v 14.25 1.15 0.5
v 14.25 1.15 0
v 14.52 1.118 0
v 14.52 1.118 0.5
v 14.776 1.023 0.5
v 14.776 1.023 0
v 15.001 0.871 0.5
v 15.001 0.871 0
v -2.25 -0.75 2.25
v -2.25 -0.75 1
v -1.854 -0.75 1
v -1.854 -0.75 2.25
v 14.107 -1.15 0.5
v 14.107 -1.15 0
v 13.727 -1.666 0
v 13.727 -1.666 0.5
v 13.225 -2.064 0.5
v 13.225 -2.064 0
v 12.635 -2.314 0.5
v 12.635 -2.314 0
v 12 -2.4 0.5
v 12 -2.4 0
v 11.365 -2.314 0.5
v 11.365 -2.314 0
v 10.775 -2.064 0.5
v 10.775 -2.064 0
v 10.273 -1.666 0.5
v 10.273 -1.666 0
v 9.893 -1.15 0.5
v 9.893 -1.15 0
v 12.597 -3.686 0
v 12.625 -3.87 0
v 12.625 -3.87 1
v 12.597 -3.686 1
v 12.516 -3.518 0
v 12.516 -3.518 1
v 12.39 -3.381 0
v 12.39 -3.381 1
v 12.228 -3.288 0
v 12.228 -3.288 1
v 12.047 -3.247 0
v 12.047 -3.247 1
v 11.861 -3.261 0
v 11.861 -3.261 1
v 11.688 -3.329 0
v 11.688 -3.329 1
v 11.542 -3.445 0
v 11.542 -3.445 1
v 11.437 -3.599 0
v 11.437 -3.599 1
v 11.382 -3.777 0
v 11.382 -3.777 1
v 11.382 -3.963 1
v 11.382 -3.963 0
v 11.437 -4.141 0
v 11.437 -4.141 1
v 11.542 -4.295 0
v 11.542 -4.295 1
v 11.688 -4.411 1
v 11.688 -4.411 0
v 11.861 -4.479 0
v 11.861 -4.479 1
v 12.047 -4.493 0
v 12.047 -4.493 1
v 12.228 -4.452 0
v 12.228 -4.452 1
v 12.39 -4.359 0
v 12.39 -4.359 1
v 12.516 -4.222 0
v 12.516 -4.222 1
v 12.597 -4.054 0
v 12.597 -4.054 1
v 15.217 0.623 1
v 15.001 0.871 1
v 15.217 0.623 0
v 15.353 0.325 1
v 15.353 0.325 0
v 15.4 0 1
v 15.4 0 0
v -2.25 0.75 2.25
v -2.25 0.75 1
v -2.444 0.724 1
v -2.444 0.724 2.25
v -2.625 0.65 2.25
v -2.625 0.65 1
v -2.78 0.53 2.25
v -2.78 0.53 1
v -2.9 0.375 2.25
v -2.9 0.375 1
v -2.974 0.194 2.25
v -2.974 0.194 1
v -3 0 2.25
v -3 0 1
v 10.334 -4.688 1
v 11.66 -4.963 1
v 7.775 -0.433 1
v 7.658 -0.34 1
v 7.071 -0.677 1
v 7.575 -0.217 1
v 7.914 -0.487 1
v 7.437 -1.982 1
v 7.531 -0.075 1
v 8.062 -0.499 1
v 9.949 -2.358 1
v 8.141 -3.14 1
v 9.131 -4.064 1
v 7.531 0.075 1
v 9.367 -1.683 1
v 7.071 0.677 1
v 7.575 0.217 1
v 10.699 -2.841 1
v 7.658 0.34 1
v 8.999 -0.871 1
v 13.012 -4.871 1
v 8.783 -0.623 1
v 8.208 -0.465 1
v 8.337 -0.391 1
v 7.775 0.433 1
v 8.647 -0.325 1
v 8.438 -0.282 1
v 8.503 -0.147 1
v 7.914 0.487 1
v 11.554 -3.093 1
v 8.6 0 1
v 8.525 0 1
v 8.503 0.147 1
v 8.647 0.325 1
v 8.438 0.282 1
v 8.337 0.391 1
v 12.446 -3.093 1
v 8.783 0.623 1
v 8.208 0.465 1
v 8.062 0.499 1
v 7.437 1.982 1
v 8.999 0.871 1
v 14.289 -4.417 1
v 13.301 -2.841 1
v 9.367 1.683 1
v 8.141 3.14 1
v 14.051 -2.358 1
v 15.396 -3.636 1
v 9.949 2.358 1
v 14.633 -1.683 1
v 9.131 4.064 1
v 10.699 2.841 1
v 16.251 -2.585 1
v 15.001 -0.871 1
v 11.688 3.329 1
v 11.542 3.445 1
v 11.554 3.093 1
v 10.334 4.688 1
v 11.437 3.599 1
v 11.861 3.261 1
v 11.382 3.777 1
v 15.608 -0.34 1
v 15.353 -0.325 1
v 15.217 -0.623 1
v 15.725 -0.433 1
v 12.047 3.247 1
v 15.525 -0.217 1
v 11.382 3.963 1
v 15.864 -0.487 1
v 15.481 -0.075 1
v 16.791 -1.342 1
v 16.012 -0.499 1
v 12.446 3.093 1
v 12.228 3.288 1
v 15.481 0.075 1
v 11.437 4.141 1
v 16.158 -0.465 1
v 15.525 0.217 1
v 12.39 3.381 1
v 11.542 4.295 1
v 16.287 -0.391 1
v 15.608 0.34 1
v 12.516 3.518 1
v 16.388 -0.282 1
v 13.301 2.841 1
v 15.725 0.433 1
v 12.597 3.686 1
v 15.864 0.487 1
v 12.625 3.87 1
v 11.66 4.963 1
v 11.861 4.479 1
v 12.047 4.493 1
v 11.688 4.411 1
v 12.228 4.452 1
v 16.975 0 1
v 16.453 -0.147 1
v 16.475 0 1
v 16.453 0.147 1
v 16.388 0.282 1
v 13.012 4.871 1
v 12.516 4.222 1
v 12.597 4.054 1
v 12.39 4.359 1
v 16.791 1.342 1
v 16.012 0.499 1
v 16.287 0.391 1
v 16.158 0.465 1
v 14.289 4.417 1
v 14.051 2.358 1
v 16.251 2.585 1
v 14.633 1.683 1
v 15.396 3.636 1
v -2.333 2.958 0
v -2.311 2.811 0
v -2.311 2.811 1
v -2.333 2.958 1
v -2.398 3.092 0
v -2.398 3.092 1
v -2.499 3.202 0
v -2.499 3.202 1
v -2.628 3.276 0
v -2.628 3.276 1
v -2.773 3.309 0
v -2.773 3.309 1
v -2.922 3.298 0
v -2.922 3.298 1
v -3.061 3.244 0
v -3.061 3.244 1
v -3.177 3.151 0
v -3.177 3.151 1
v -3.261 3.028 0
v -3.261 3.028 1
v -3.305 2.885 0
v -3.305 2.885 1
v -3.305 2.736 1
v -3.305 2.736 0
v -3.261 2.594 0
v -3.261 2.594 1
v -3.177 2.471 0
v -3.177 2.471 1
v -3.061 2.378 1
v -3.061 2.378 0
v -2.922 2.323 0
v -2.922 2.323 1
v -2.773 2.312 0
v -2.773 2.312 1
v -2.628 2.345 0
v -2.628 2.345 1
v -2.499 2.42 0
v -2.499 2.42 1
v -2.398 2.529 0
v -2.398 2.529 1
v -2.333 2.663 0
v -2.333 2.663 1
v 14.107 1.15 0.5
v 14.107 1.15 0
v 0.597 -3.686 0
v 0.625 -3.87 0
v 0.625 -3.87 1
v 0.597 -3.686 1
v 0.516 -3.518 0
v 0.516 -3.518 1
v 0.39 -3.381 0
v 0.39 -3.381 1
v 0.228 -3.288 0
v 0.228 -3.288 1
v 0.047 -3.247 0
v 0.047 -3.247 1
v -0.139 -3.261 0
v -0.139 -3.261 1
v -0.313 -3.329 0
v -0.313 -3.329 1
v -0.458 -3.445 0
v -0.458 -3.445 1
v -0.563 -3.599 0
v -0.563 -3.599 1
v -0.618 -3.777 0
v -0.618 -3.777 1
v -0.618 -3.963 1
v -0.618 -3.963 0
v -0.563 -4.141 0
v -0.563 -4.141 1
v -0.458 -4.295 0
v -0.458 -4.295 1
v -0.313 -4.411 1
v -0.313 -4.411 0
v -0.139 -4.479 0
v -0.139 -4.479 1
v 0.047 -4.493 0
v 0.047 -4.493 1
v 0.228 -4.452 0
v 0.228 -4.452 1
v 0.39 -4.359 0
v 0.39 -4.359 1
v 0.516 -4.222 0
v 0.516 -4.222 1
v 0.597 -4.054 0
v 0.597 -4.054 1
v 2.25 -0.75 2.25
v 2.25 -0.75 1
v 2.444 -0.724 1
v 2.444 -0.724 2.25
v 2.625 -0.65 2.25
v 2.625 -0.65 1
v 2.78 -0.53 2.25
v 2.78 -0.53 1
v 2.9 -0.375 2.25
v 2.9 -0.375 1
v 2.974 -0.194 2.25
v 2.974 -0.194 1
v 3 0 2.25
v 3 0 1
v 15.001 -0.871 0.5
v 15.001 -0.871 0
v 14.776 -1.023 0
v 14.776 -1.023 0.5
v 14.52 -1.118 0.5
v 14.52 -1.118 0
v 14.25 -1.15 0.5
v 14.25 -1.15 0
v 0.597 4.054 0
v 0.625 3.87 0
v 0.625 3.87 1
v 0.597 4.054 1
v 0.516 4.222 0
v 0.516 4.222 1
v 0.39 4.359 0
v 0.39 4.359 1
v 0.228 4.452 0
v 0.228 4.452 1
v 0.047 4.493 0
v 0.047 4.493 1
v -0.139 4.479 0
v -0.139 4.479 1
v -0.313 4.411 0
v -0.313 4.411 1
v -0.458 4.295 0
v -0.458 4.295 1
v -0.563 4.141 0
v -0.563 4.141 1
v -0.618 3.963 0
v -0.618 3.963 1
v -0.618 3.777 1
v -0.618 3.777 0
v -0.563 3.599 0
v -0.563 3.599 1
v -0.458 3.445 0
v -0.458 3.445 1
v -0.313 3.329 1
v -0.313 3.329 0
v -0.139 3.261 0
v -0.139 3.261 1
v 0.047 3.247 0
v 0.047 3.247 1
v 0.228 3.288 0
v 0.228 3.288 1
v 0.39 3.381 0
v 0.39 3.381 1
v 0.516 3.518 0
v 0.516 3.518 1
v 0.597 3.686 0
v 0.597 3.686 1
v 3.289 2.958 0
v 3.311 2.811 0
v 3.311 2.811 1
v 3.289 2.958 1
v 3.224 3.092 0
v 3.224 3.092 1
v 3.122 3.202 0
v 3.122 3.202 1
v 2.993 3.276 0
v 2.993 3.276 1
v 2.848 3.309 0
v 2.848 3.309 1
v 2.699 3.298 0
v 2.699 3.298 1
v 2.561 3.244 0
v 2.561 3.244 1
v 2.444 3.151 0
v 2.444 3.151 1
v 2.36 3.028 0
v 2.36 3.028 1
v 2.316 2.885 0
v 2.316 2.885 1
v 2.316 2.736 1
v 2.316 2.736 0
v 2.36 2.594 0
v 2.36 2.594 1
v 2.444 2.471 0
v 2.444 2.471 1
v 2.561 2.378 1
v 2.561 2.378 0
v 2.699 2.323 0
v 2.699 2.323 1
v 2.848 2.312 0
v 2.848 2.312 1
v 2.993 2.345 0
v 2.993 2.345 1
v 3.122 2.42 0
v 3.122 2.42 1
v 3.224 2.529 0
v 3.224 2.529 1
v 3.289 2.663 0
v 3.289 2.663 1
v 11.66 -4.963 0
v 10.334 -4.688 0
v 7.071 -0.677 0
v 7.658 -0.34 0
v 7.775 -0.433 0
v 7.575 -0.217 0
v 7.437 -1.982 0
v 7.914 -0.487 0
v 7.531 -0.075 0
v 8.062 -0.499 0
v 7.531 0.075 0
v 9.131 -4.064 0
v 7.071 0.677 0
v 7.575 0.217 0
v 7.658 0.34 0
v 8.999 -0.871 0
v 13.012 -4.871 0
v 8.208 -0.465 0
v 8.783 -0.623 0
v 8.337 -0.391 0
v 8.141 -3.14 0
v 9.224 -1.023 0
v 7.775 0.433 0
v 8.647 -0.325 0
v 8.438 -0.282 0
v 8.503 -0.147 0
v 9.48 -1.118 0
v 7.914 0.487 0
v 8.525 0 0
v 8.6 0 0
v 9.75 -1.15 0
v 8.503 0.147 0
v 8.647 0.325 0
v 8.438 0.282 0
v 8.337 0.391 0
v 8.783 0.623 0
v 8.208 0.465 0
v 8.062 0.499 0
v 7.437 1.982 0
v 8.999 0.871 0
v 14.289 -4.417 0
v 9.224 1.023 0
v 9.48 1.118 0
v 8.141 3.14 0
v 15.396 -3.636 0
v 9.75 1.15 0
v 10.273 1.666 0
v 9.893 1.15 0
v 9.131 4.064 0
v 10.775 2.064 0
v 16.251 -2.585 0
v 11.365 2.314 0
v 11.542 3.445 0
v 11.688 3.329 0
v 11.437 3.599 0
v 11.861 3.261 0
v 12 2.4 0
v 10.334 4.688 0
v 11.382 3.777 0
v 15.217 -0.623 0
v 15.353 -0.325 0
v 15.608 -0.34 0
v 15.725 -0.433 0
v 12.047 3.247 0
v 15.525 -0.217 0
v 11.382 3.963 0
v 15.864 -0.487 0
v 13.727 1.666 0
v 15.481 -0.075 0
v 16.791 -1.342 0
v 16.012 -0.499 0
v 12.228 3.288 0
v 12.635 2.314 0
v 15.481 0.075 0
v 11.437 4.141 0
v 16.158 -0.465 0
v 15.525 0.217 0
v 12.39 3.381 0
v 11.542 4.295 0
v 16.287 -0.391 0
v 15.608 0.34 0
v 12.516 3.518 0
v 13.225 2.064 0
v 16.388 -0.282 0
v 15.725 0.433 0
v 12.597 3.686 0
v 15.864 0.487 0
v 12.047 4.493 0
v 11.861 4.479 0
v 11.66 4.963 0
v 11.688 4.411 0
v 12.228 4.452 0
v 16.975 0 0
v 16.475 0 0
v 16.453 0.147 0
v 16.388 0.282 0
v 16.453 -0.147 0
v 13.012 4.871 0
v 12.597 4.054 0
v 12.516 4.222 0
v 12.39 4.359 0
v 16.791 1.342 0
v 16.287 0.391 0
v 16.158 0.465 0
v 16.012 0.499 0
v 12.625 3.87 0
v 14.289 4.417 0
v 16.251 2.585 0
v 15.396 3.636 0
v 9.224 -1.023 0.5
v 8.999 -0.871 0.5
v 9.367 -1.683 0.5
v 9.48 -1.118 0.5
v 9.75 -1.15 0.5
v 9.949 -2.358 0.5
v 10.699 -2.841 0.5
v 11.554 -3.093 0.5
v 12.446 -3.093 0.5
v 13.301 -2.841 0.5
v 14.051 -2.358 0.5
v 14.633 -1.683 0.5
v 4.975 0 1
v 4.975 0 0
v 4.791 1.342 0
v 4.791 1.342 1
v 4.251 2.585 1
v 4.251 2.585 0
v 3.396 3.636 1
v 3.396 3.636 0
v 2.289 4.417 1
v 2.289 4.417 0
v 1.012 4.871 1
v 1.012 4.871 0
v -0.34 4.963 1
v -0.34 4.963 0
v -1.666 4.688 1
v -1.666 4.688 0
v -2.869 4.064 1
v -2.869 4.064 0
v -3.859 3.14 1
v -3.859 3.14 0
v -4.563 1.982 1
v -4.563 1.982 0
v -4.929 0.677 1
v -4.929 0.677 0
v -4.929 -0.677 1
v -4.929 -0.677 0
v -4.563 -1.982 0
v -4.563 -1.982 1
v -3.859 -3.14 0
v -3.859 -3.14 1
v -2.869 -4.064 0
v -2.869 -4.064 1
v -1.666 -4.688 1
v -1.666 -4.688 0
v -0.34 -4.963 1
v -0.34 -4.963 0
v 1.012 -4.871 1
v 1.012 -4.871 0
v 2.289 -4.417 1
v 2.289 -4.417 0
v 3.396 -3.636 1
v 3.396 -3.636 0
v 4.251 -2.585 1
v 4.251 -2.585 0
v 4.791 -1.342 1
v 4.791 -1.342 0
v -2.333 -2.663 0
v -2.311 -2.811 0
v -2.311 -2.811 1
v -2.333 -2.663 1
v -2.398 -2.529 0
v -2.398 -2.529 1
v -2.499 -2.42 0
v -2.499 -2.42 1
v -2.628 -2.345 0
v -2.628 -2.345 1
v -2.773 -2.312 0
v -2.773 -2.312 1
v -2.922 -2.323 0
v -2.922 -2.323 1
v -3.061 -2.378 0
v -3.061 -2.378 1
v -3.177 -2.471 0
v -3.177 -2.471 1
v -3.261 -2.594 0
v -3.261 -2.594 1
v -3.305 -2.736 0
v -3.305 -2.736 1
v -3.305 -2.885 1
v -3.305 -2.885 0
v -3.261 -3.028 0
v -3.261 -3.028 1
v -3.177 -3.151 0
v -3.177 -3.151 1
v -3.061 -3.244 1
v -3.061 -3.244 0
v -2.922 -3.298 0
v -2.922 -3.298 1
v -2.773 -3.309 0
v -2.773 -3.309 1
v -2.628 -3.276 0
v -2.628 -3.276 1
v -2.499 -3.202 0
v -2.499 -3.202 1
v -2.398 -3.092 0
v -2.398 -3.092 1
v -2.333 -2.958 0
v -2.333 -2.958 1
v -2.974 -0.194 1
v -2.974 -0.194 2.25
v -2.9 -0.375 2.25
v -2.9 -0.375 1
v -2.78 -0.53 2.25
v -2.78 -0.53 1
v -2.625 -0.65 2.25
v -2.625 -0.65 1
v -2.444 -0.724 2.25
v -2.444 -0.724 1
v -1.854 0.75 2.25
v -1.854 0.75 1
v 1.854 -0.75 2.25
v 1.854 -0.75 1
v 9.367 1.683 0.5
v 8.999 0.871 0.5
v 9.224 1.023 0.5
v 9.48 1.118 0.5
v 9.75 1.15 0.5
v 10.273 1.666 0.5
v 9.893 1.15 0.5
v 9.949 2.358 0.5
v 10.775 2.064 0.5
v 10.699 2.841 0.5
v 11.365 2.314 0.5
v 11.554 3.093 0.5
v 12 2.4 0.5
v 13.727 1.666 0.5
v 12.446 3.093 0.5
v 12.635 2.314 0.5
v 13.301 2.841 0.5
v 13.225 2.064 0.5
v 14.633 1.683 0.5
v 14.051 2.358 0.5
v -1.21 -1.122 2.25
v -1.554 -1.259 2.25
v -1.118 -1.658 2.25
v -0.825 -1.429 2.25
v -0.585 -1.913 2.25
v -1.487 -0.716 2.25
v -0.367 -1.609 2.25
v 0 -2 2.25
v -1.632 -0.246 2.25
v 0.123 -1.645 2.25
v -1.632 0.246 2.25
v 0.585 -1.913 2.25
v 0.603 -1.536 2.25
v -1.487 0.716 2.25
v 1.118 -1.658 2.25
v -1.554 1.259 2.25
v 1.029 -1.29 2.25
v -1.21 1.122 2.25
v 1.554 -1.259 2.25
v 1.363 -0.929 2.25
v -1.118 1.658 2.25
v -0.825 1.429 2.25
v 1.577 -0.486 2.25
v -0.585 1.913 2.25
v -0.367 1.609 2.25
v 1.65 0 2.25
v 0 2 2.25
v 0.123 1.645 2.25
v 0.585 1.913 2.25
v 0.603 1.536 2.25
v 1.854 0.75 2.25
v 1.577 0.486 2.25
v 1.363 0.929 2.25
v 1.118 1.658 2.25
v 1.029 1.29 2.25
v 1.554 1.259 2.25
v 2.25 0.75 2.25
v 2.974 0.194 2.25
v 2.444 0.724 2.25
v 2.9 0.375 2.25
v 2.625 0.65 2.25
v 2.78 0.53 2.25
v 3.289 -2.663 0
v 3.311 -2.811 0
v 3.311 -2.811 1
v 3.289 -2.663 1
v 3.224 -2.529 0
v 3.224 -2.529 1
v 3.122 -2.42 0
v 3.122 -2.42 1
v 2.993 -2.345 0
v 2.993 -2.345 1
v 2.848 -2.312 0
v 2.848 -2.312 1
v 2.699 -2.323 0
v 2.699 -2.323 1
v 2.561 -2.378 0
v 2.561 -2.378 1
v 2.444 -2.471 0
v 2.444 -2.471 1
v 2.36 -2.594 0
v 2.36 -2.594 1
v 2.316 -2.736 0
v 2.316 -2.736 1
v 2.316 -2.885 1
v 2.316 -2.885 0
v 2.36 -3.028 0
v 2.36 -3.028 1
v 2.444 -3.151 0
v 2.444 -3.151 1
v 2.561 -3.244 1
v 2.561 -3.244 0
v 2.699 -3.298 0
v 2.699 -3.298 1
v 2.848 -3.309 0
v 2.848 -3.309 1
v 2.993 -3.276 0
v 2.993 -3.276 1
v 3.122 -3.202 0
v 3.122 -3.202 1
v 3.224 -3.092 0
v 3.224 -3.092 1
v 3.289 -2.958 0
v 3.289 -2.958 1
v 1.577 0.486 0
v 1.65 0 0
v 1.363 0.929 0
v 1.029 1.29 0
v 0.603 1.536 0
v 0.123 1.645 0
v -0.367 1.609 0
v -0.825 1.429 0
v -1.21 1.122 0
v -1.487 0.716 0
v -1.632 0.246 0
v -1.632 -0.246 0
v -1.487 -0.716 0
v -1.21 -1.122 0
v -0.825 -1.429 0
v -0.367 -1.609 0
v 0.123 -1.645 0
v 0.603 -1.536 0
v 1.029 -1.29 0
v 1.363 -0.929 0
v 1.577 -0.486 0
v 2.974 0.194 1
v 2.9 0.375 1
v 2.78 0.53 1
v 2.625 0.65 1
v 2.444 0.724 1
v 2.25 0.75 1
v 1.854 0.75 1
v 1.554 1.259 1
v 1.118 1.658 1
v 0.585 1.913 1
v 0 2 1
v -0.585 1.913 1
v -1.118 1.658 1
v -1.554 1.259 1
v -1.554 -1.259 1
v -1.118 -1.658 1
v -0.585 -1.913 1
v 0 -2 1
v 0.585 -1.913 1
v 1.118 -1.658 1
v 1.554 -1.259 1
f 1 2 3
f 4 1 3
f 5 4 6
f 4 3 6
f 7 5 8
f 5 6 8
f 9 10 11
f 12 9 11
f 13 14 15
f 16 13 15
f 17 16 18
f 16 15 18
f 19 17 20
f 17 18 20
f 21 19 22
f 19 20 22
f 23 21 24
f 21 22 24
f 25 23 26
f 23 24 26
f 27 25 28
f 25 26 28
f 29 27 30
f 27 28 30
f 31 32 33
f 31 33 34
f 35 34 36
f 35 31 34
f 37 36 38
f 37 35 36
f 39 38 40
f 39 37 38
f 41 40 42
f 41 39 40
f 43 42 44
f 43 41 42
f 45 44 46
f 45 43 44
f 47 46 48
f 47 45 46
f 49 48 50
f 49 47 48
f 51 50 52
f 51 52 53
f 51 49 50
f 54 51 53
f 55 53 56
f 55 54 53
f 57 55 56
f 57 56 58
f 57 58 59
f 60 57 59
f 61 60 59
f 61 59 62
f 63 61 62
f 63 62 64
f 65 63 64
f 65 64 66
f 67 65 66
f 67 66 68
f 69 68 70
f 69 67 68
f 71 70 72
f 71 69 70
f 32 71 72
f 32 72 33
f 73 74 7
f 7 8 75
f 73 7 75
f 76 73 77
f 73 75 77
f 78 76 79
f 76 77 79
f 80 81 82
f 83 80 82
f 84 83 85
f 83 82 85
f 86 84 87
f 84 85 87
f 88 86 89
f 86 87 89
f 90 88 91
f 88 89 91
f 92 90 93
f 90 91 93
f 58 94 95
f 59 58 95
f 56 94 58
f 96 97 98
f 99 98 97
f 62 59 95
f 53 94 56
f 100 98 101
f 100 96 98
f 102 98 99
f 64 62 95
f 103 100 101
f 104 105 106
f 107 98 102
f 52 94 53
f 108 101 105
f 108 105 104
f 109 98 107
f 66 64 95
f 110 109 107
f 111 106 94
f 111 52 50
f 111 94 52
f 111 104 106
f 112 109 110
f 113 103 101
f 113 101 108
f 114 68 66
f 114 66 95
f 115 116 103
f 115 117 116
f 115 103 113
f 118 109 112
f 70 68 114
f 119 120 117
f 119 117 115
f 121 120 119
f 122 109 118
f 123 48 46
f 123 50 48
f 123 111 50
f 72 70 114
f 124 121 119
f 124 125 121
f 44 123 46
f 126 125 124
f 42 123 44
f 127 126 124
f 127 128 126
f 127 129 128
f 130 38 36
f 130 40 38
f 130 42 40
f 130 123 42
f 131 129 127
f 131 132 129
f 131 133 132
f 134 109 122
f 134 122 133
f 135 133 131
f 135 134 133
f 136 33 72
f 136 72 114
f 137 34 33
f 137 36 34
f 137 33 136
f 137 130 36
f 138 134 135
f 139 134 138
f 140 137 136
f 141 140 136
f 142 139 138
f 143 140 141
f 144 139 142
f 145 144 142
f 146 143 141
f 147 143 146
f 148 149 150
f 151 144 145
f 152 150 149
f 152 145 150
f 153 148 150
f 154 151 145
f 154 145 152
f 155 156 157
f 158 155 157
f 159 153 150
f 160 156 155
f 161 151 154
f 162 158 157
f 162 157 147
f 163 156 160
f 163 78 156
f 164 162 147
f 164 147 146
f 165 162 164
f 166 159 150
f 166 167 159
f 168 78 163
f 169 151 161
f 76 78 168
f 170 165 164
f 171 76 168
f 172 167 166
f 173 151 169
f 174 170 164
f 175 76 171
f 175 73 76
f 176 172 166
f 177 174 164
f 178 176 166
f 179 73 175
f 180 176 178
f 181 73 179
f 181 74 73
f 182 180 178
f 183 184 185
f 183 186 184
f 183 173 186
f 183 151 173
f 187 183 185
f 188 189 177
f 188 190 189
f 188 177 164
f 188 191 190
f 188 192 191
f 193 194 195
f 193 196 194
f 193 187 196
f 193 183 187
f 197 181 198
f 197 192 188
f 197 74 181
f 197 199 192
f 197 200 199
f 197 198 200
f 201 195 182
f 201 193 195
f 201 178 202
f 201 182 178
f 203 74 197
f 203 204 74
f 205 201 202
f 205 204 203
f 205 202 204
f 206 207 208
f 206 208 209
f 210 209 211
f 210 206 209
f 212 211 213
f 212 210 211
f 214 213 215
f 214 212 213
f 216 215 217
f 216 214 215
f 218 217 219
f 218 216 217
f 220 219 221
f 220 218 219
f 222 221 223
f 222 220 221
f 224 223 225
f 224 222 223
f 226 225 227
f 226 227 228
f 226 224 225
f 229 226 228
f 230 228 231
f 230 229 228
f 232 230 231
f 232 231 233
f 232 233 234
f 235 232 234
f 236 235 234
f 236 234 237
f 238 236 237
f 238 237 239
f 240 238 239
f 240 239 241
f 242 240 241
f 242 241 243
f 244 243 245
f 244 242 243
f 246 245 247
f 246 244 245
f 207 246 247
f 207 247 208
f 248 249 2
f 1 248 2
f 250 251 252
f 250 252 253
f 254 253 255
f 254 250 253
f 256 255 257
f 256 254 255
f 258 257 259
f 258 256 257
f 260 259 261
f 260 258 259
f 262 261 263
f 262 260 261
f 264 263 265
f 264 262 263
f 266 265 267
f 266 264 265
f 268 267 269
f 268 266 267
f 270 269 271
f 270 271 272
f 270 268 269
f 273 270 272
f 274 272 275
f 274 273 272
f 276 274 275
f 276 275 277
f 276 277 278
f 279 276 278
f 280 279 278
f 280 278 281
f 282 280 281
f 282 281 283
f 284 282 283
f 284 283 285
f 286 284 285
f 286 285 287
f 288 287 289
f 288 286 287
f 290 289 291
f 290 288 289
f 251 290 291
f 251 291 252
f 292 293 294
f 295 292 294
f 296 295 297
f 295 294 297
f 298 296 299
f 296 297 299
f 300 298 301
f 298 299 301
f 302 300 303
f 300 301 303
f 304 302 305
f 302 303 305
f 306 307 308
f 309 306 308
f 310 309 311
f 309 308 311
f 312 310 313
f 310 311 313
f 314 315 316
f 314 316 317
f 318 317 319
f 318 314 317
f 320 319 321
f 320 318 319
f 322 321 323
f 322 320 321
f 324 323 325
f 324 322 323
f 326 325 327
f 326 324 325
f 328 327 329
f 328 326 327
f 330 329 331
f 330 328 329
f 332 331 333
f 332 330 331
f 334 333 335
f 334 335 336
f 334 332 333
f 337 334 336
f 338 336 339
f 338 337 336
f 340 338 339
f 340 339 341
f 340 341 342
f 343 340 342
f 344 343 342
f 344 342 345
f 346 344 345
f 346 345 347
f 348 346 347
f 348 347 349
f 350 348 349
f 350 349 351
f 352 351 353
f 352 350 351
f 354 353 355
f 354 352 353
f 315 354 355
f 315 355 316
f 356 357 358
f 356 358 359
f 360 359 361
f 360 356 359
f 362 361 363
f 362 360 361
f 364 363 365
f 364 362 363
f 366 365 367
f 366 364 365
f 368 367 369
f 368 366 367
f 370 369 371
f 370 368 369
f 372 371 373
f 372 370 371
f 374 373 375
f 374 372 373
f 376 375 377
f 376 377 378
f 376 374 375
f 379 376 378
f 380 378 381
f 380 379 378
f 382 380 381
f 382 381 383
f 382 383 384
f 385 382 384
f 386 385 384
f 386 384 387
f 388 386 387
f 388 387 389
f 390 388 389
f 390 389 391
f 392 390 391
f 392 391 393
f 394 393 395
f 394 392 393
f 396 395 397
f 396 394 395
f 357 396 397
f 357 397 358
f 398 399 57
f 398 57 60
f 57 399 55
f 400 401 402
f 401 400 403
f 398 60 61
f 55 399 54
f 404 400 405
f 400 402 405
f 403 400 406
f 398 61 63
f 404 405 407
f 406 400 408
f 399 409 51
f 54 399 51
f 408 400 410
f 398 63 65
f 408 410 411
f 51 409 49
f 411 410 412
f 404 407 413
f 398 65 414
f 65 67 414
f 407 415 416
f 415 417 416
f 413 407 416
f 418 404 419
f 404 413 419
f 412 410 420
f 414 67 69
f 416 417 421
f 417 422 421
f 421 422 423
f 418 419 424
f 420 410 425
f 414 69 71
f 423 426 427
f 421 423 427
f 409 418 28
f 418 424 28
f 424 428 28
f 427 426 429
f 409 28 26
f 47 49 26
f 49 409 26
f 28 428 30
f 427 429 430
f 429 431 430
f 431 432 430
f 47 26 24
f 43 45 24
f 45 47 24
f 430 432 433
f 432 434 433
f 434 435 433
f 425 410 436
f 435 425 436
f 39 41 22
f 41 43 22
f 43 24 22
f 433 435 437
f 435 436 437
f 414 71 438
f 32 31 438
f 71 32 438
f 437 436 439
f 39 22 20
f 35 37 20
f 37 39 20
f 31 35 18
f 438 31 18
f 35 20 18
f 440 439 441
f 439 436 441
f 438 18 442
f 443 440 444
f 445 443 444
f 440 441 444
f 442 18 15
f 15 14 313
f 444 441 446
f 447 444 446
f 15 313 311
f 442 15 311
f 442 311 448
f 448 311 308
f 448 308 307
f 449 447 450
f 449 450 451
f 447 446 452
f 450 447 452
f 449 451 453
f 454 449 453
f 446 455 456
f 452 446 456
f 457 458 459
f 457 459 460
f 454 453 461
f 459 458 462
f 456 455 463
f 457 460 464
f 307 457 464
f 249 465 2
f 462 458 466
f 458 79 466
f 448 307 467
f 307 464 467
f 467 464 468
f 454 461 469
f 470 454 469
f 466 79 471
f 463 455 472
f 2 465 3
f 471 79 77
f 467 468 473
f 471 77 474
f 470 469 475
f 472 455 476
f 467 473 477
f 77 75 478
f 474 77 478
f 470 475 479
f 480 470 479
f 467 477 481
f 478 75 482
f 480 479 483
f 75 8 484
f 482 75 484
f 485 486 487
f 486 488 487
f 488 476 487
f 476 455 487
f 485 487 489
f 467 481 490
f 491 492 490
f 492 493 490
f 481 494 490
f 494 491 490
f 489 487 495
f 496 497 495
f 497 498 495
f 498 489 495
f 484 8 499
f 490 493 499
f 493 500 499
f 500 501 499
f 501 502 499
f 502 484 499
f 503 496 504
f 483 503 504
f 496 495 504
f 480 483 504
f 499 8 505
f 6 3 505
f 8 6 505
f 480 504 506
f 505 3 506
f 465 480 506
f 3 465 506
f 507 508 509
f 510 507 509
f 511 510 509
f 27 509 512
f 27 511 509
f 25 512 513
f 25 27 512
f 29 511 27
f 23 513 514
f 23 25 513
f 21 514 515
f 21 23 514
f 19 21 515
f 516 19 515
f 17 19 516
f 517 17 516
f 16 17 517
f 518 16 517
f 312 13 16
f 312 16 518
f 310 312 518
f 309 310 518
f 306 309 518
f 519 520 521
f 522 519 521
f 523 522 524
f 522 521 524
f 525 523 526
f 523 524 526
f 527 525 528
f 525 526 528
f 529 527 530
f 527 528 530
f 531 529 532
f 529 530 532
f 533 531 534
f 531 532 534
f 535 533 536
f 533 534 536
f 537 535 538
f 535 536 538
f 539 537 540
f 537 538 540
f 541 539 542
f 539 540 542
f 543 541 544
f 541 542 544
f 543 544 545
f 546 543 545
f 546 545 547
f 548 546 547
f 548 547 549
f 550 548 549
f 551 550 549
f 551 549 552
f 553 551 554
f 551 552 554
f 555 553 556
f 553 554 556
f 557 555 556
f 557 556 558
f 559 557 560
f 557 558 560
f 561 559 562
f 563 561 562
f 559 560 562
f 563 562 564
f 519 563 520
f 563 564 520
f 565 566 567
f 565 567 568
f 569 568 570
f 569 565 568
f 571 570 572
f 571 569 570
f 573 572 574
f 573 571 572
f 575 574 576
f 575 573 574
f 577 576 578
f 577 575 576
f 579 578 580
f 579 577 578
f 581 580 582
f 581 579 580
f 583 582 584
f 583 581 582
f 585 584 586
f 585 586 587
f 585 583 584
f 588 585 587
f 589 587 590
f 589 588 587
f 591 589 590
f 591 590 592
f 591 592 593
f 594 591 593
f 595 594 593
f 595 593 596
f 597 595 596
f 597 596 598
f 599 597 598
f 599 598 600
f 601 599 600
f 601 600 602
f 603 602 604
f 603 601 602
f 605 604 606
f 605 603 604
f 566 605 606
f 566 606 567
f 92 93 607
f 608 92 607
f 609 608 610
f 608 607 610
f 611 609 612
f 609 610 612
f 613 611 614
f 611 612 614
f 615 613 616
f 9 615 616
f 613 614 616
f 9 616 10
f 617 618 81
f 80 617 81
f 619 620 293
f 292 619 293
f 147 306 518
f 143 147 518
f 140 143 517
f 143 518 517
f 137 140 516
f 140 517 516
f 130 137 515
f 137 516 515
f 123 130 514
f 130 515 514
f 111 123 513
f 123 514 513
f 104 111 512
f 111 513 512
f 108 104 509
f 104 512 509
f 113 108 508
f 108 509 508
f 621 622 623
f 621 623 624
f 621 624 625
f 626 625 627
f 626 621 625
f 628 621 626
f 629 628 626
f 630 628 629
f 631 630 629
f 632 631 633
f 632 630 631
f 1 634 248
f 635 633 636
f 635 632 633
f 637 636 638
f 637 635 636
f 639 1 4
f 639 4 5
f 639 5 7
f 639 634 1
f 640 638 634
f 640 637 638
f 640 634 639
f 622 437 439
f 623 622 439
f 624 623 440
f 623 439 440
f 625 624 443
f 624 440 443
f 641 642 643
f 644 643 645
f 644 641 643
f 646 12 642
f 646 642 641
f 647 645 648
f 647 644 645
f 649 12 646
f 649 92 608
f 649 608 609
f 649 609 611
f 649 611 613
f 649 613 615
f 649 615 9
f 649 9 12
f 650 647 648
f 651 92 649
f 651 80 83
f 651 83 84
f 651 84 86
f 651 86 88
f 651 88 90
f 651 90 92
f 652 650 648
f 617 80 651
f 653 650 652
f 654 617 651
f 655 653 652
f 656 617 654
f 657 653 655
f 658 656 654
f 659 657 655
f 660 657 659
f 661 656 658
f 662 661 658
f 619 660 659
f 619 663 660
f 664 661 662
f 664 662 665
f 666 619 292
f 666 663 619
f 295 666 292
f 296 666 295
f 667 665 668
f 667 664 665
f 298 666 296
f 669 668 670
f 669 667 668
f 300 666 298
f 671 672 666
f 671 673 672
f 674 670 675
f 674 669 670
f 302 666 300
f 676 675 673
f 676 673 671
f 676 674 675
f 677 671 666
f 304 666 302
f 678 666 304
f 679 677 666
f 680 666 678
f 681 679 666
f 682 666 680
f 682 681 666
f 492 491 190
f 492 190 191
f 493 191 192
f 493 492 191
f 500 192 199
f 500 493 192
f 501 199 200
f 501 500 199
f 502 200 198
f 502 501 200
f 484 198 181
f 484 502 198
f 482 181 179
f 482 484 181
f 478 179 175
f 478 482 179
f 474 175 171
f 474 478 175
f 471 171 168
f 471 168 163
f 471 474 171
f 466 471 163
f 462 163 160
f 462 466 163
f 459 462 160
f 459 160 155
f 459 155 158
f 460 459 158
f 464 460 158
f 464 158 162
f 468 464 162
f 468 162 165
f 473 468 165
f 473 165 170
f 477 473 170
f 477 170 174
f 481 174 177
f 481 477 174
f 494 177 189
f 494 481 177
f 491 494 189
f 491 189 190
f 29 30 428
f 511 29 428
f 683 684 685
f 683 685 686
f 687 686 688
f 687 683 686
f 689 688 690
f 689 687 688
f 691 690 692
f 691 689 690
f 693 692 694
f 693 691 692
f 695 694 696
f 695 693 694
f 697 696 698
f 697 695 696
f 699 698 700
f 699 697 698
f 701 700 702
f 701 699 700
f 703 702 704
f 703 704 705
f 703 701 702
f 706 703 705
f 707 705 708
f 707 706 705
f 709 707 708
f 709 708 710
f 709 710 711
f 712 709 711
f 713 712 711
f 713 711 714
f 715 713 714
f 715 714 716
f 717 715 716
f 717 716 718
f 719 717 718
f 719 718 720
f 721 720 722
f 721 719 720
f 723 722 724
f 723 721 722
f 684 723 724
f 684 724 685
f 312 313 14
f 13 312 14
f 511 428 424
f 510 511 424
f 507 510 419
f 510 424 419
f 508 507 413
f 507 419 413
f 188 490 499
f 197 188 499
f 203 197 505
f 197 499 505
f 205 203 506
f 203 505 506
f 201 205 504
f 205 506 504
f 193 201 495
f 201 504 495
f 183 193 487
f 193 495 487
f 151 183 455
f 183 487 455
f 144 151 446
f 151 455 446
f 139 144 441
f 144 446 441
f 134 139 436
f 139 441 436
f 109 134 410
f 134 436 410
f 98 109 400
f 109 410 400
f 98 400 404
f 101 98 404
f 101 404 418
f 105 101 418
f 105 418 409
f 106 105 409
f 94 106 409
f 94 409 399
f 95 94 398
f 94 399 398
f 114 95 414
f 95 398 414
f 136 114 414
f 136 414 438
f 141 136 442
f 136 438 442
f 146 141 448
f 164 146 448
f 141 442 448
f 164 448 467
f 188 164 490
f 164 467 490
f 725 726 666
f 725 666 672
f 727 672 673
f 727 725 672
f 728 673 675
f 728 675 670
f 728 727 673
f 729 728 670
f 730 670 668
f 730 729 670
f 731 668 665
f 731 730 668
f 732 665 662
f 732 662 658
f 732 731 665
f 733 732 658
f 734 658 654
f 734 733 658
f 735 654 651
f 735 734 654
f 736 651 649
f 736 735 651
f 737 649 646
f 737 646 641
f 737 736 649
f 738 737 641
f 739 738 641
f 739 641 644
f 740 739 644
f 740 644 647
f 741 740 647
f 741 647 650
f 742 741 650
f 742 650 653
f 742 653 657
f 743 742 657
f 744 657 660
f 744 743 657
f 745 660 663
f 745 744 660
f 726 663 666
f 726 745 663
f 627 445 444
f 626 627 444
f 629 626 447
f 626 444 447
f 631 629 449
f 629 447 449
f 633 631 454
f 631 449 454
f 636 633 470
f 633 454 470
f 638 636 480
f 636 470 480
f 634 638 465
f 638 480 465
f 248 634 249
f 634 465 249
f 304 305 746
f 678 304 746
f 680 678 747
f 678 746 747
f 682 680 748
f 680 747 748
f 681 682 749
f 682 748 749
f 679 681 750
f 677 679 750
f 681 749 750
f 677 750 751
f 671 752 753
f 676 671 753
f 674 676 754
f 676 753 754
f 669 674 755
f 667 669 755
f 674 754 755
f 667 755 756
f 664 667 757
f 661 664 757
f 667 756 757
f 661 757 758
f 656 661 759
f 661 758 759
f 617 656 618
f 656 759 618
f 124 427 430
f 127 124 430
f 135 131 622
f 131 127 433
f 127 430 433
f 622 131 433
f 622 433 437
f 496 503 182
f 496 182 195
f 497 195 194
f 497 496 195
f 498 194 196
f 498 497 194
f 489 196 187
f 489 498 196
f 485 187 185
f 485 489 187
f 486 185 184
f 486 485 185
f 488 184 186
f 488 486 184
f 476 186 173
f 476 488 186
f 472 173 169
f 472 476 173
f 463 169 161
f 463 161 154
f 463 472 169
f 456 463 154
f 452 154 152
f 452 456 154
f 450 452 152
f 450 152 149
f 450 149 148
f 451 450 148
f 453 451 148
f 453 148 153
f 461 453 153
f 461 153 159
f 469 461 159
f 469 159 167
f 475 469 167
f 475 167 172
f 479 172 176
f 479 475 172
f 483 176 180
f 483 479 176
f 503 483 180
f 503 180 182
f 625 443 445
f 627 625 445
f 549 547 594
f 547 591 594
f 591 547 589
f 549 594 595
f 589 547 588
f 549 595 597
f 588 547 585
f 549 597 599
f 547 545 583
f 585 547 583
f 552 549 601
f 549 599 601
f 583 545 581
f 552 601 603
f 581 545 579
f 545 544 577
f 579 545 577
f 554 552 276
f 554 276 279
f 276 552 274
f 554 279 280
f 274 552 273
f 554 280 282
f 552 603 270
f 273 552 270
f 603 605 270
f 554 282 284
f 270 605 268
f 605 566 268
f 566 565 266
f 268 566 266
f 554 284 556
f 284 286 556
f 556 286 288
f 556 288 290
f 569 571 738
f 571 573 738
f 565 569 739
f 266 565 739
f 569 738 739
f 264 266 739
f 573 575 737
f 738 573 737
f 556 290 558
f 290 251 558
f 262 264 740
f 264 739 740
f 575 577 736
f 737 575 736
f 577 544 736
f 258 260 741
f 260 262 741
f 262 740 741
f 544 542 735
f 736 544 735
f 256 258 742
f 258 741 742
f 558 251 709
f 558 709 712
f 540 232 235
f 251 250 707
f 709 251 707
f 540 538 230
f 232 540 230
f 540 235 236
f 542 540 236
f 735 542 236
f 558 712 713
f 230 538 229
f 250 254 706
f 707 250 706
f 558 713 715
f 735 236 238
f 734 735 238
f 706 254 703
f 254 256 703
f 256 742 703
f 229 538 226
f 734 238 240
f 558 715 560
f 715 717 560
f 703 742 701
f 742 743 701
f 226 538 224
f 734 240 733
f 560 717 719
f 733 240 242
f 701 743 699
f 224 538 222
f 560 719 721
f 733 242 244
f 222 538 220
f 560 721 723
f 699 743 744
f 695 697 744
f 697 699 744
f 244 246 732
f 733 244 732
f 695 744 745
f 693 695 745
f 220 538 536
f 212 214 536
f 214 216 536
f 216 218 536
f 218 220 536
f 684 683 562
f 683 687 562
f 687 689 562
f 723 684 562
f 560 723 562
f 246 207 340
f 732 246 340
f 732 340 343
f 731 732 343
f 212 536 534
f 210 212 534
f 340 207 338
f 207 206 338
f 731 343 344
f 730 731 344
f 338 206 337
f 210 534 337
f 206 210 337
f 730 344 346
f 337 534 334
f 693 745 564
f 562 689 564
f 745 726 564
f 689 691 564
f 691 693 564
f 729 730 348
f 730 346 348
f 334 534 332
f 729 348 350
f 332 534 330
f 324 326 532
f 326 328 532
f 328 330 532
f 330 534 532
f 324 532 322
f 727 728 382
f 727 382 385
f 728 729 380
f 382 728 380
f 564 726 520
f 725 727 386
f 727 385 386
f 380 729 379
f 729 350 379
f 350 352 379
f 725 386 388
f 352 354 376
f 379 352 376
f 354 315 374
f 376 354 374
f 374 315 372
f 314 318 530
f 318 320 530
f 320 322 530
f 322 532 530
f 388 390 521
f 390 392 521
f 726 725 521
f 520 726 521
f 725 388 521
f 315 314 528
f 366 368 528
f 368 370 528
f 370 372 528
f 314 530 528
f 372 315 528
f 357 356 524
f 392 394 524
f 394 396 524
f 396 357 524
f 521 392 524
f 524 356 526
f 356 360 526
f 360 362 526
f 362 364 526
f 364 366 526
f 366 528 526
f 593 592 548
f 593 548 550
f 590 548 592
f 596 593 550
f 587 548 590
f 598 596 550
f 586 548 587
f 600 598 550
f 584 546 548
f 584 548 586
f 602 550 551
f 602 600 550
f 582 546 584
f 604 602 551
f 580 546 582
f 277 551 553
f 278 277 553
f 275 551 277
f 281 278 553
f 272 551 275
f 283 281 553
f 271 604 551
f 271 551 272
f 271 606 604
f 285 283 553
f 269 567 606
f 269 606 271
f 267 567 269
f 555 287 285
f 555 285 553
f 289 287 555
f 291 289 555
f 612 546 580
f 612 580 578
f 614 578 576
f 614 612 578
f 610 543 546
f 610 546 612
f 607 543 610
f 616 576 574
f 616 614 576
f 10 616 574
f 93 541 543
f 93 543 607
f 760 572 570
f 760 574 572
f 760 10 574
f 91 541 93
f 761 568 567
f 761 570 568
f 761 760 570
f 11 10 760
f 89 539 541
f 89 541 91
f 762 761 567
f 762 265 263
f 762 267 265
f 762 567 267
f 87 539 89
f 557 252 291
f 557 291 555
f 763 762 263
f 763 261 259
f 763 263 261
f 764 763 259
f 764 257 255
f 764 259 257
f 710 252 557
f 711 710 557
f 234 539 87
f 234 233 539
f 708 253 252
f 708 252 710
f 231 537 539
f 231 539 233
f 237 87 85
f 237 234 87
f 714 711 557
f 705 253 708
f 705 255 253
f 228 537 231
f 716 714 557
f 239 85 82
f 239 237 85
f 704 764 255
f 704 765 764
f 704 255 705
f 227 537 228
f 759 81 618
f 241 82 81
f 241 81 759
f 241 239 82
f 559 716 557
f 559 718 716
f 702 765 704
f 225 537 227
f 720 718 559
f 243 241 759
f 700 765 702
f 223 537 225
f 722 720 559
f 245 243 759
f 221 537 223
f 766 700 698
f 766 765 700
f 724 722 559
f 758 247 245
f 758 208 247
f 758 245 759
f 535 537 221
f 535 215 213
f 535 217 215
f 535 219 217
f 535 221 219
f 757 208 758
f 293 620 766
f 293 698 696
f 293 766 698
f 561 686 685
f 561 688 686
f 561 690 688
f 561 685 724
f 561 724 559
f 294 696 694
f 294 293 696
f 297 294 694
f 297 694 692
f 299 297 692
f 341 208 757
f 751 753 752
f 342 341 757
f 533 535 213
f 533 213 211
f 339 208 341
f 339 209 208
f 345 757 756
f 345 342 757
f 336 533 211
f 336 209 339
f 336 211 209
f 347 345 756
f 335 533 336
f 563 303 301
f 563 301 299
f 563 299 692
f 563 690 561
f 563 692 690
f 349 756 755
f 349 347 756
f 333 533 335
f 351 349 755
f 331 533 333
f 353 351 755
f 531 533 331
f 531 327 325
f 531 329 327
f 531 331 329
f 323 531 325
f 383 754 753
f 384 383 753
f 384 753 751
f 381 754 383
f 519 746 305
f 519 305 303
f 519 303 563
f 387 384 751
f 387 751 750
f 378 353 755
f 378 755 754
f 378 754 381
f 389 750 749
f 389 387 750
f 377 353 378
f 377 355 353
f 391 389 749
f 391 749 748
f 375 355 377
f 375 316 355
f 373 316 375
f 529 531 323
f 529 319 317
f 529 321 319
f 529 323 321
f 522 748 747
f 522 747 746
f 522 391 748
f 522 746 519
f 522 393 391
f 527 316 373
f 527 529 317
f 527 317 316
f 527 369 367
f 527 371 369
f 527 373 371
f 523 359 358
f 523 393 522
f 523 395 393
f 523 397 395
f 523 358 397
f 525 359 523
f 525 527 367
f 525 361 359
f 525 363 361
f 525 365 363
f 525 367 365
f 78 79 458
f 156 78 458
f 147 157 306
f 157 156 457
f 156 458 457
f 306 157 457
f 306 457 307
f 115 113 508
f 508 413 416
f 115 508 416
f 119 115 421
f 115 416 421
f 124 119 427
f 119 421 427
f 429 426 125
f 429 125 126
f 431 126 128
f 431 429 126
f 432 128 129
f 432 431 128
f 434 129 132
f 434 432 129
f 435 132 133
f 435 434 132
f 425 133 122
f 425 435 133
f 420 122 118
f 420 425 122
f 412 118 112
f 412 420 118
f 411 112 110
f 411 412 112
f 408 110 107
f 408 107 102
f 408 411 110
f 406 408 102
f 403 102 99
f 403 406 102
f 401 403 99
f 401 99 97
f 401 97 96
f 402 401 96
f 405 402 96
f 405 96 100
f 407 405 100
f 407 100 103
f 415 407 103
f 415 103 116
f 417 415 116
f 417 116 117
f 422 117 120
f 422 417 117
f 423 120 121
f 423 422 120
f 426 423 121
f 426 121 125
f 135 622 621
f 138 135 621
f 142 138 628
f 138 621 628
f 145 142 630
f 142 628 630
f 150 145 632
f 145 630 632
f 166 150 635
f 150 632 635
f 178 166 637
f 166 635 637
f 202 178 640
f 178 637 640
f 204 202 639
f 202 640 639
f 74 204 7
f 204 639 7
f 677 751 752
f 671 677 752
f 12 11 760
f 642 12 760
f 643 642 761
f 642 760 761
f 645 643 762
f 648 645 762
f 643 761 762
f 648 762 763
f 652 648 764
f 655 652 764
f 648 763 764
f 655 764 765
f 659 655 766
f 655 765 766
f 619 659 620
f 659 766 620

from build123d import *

# Parameters (mm, degrees)
F0_R     = 4.975
F0_R_2   = 0.625
F0_R_3   = 0.5
F1_DEPTH = 1
F0_R_4   = 1.65
F2_DEPTH = 2.25
F3_DEPTH = 1
F4_DEPTH = 0.5


with BuildPart() as f1:
    # F0 (on Top) → F1 (new body)
    with BuildSketch(Plane.XY):
        Circle(F0_R)
        with Locations((0, -3.87)):
            Circle(F0_R_2, mode=Mode.SUBTRACT)
        with Locations((-2.810749, -2.810749)):
            Circle(F0_R_3, mode=Mode.SUBTRACT)
        with Locations((2.810749, -2.810749)):
            Circle(F0_R_3, mode=Mode.SUBTRACT)
        with BuildLine():
            Line((-1.988247, -0.75), (-2.25, -0.75))
            ThreePointArc((-2.25, -0.75), (-2.78033, -0.53033), (-3, 0))
            ThreePointArc((-3, 0), (-2.78033, 0.53033), (-2.25, 0.75))
            Line((-2.25, 0.75), (-1.988247, 0.75))
            Line((-1.988247, 0.75), (-1.85405, 0.75))
            ThreePointArc((-1.85405, 0.75), (0, 2), (1.85405, 0.75))
            Line((1.85405, 0.75), (1.988247, 0.75))
            Line((1.988247, 0.75), (2.25, 0.75))
            ThreePointArc((2.25, 0.75), (2.78033, 0.53033), (3, 0))
            ThreePointArc((3, 0), (2.78033, -0.53033), (2.25, -0.75))
            Line((2.25, -0.75), (1.988247, -0.75))
            Line((1.988247, -0.75), (1.85405, -0.75))
            ThreePointArc((1.85405, -0.75), (0, -2), (-1.85405, -0.75))
            Line((-1.85405, -0.75), (-1.988247, -0.75))
        make_face(mode=Mode.SUBTRACT)
        with Locations((-2.810749, 2.810749)):
            Circle(F0_R_3, mode=Mode.SUBTRACT)
        with Locations((0, 3.87)):
            Circle(F0_R_2, mode=Mode.SUBTRACT)
        with Locations((2.810749, 2.810749)):
            Circle(F0_R_3, mode=Mode.SUBTRACT)
    extrude(amount=F1_DEPTH)

    # F0 (on Top) → F2 (join)
    with BuildSketch(Plane.XY):
        with BuildLine():
            ThreePointArc((2, 0), (1.963173, -0.382035), (1.85405, -0.75))
            Line((1.85405, -0.75), (1.988247, -0.75))
            Line((1.988247, -0.75), (2.25, -0.75))
            ThreePointArc((2.25, -0.75), (2.78033, -0.53033), (3, 0))
            ThreePointArc((3, 0), (2.78033, 0.53033), (2.25, 0.75))
            Line((2.25, 0.75), (1.988247, 0.75))
            Line((1.988247, 0.75), (1.85405, 0.75))
            ThreePointArc((1.85405, 0.75), (1.963173, 0.382035), (2, 0))
        make_face()
        with BuildLine():
            ThreePointArc((-1.85405, 0.75), (-2, 0), (-1.85405, -0.75))
            ThreePointArc((-1.85405, -0.75), (0, -2), (1.85405, -0.75))
            ThreePointArc((1.85405, -0.75), (1.963173, -0.382035), (2, 0))
            ThreePointArc((2, 0), (1.963173, 0.382035), (1.85405, 0.75))
            ThreePointArc((1.85405, 0.75), (0, 2), (-1.85405, 0.75))
        make_face()
        Circle(F0_R_4, mode=Mode.SUBTRACT)
        with BuildLine():
            ThreePointArc((-3, 0), (-2.78033, -0.53033), (-2.25, -0.75))
            Line((-2.25, -0.75), (-1.988247, -0.75))
            Line((-1.988247, -0.75), (-1.85405, -0.75))
            ThreePointArc((-1.85405, -0.75), (-2, 0), (-1.85405, 0.75))
            Line((-1.85405, 0.75), (-1.988247, 0.75))
            Line((-1.988247, 0.75), (-2.25, 0.75))
            ThreePointArc((-2.25, 0.75), (-2.78033, 0.53033), (-3, 0))
        make_face()
    extrude(amount=F2_DEPTH)


with BuildPart() as f3:
    # F0 (on Top) → F3 (new body)
    with BuildSketch(Plane.XY):
        with Locations((12, 0)):
            Circle(F0_R)
        with Locations((12, -3.87)):
            Circle(F0_R_2, mode=Mode.SUBTRACT)
        with Locations((8.025, 0)):
            Circle(F0_R_3, mode=Mode.SUBTRACT)
        with BuildLine():
            ThreePointArc((8.99875, 0.870703), (12, 3.125), (15.00125, 0.870703))
            ThreePointArc((15.00125, 0.870703), (15.295571, 0.478833), (15.4, 0))
            ThreePointArc((15.4, 0), (15.295571, -0.478833), (15.00125, -0.870703))
            ThreePointArc((15.00125, -0.870703), (12, -3.125), (8.99875, -0.870703))
            ThreePointArc((8.99875, -0.870703), (8.704429, -0.478833), (8.6, 0))
            ThreePointArc((8.6, 0), (8.704429, 0.478833), (8.99875, 0.870703))
        make_face(mode=Mode.SUBTRACT)
        with Locations((15.975, 0)):
            Circle(F0_R_3, mode=Mode.SUBTRACT)
        with Locations((12, 3.87)):
            Circle(F0_R_2, mode=Mode.SUBTRACT)
    extrude(amount=F3_DEPTH)

    # F0 (on Top) → F4 (join)
    with BuildSketch(Plane.XY):
        with BuildLine():
            ThreePointArc((8.99875, -0.870703), (12, -3.125), (15.00125, -0.870703))
            ThreePointArc((15.00125, -0.870703), (14.650744, -1.077917), (14.25, -1.15))
            Line((14.25, -1.15), (14.106537, -1.15))
            ThreePointArc((14.106537, -1.15), (12, -2.4), (9.893463, -1.15))
            Line((9.893463, -1.15), (9.75, -1.15))
            ThreePointArc((9.75, -1.15), (9.349256, -1.077917), (8.99875, -0.870703))
        make_face()
        with BuildLine():
            ThreePointArc((14.25, 1.15), (14.650744, 1.077917), (15.00125, 0.870703))
            ThreePointArc((15.00125, 0.870703), (12, 3.125), (8.99875, 0.870703))
            ThreePointArc((8.99875, 0.870703), (9.349256, 1.077917), (9.75, 1.15))
            Line((9.75, 1.15), (9.893463, 1.15))
            ThreePointArc((9.893463, 1.15), (12, 2.4), (14.106537, 1.15))
            Line((14.106537, 1.15), (14.25, 1.15))
        make_face()
    extrude(amount=F4_DEPTH)


solid = Compound([f1.part, f3.part])
